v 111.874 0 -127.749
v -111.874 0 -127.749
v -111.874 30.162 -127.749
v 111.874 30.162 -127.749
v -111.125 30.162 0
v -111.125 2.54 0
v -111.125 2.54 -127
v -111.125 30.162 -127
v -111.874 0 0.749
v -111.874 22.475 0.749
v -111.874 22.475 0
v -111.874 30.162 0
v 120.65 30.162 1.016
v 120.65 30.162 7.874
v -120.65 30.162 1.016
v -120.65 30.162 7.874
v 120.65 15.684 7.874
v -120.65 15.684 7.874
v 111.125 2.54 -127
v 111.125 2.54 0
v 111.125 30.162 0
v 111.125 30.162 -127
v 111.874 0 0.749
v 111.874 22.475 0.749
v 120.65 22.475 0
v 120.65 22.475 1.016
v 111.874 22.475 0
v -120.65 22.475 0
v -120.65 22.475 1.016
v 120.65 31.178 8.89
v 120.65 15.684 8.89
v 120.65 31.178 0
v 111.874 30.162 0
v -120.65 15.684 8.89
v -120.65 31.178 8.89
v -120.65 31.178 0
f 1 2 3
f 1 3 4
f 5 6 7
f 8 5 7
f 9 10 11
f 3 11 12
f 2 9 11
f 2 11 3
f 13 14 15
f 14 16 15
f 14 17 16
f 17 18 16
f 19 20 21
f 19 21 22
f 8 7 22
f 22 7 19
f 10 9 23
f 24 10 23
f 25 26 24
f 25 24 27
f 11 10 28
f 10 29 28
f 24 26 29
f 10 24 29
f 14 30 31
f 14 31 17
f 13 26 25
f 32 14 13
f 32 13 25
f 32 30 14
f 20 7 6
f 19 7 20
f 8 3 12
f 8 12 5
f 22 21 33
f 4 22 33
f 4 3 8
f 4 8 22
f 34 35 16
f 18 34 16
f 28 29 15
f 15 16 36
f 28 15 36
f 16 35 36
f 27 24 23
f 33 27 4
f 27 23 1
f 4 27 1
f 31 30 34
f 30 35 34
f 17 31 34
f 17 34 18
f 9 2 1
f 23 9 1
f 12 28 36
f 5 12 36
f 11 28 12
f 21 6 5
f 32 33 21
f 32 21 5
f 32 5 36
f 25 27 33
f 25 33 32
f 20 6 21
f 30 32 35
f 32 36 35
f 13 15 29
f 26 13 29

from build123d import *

# Parameters (mm, degrees)
SKETCH1_W         = 223.7486
SKETCH1_H         = 128.4986
BASE_DEPTH        = 2.54
SKETCH1_3_W       = 223.7486
SKETCH1_3_H       = 128.4986
SKETCH1_3_W_2     = 222.25
SKETCH1_3_H_2     = 127
WALLS_DEPTH       = 30.1625
HANDLE_DEPTH      = 120.65
HANDLE_DEPTH_BACK = 120.65


with BuildPart() as part:
    # Sketch1 → Base (new body)
    with BuildSketch(Plane(origin=(0, 0, 0), x_dir=(1, 0, 0), z_dir=(0, 1, 0))):
        with Locations((0, 63.5)):
            Rectangle(SKETCH1_W, SKETCH1_H)
    extrude(amount=BASE_DEPTH)

    # Sketch1<3> → Walls (add)
    with BuildSketch(Plane(origin=(0, 0, 0), x_dir=(1, 0, 0), z_dir=(0, 1, 0))):
        with Locations((0, 63.5)):
            Rectangle(SKETCH1_3_W, SKETCH1_3_H)
        with Locations((0, 63.5)):
            Rectangle(SKETCH1_3_W_2, SKETCH1_3_H_2, mode=Mode.SUBTRACT)
    extrude(amount=WALLS_DEPTH)

    # Sketch2 → Handle (add, two sides: drawn at the far end of the back side and taken through both)
    with BuildSketch(Plane(origin=(0, 0, 0), x_dir=(0, 0, -1), z_dir=(1, 0, 0)).offset(-HANDLE_DEPTH_BACK)):
        Polygon((0, 22.475414602), (0, 31.1785), (-8.89, 31.1785), (-8.89, 15.6845), (-7.874, 15.6845), (-7.874, 30.1625), (-1.016, 30.1625), (-1.016, 22.475414602), align=None)
    extrude(amount=HANDLE_DEPTH + HANDLE_DEPTH_BACK)


solid = part.part
